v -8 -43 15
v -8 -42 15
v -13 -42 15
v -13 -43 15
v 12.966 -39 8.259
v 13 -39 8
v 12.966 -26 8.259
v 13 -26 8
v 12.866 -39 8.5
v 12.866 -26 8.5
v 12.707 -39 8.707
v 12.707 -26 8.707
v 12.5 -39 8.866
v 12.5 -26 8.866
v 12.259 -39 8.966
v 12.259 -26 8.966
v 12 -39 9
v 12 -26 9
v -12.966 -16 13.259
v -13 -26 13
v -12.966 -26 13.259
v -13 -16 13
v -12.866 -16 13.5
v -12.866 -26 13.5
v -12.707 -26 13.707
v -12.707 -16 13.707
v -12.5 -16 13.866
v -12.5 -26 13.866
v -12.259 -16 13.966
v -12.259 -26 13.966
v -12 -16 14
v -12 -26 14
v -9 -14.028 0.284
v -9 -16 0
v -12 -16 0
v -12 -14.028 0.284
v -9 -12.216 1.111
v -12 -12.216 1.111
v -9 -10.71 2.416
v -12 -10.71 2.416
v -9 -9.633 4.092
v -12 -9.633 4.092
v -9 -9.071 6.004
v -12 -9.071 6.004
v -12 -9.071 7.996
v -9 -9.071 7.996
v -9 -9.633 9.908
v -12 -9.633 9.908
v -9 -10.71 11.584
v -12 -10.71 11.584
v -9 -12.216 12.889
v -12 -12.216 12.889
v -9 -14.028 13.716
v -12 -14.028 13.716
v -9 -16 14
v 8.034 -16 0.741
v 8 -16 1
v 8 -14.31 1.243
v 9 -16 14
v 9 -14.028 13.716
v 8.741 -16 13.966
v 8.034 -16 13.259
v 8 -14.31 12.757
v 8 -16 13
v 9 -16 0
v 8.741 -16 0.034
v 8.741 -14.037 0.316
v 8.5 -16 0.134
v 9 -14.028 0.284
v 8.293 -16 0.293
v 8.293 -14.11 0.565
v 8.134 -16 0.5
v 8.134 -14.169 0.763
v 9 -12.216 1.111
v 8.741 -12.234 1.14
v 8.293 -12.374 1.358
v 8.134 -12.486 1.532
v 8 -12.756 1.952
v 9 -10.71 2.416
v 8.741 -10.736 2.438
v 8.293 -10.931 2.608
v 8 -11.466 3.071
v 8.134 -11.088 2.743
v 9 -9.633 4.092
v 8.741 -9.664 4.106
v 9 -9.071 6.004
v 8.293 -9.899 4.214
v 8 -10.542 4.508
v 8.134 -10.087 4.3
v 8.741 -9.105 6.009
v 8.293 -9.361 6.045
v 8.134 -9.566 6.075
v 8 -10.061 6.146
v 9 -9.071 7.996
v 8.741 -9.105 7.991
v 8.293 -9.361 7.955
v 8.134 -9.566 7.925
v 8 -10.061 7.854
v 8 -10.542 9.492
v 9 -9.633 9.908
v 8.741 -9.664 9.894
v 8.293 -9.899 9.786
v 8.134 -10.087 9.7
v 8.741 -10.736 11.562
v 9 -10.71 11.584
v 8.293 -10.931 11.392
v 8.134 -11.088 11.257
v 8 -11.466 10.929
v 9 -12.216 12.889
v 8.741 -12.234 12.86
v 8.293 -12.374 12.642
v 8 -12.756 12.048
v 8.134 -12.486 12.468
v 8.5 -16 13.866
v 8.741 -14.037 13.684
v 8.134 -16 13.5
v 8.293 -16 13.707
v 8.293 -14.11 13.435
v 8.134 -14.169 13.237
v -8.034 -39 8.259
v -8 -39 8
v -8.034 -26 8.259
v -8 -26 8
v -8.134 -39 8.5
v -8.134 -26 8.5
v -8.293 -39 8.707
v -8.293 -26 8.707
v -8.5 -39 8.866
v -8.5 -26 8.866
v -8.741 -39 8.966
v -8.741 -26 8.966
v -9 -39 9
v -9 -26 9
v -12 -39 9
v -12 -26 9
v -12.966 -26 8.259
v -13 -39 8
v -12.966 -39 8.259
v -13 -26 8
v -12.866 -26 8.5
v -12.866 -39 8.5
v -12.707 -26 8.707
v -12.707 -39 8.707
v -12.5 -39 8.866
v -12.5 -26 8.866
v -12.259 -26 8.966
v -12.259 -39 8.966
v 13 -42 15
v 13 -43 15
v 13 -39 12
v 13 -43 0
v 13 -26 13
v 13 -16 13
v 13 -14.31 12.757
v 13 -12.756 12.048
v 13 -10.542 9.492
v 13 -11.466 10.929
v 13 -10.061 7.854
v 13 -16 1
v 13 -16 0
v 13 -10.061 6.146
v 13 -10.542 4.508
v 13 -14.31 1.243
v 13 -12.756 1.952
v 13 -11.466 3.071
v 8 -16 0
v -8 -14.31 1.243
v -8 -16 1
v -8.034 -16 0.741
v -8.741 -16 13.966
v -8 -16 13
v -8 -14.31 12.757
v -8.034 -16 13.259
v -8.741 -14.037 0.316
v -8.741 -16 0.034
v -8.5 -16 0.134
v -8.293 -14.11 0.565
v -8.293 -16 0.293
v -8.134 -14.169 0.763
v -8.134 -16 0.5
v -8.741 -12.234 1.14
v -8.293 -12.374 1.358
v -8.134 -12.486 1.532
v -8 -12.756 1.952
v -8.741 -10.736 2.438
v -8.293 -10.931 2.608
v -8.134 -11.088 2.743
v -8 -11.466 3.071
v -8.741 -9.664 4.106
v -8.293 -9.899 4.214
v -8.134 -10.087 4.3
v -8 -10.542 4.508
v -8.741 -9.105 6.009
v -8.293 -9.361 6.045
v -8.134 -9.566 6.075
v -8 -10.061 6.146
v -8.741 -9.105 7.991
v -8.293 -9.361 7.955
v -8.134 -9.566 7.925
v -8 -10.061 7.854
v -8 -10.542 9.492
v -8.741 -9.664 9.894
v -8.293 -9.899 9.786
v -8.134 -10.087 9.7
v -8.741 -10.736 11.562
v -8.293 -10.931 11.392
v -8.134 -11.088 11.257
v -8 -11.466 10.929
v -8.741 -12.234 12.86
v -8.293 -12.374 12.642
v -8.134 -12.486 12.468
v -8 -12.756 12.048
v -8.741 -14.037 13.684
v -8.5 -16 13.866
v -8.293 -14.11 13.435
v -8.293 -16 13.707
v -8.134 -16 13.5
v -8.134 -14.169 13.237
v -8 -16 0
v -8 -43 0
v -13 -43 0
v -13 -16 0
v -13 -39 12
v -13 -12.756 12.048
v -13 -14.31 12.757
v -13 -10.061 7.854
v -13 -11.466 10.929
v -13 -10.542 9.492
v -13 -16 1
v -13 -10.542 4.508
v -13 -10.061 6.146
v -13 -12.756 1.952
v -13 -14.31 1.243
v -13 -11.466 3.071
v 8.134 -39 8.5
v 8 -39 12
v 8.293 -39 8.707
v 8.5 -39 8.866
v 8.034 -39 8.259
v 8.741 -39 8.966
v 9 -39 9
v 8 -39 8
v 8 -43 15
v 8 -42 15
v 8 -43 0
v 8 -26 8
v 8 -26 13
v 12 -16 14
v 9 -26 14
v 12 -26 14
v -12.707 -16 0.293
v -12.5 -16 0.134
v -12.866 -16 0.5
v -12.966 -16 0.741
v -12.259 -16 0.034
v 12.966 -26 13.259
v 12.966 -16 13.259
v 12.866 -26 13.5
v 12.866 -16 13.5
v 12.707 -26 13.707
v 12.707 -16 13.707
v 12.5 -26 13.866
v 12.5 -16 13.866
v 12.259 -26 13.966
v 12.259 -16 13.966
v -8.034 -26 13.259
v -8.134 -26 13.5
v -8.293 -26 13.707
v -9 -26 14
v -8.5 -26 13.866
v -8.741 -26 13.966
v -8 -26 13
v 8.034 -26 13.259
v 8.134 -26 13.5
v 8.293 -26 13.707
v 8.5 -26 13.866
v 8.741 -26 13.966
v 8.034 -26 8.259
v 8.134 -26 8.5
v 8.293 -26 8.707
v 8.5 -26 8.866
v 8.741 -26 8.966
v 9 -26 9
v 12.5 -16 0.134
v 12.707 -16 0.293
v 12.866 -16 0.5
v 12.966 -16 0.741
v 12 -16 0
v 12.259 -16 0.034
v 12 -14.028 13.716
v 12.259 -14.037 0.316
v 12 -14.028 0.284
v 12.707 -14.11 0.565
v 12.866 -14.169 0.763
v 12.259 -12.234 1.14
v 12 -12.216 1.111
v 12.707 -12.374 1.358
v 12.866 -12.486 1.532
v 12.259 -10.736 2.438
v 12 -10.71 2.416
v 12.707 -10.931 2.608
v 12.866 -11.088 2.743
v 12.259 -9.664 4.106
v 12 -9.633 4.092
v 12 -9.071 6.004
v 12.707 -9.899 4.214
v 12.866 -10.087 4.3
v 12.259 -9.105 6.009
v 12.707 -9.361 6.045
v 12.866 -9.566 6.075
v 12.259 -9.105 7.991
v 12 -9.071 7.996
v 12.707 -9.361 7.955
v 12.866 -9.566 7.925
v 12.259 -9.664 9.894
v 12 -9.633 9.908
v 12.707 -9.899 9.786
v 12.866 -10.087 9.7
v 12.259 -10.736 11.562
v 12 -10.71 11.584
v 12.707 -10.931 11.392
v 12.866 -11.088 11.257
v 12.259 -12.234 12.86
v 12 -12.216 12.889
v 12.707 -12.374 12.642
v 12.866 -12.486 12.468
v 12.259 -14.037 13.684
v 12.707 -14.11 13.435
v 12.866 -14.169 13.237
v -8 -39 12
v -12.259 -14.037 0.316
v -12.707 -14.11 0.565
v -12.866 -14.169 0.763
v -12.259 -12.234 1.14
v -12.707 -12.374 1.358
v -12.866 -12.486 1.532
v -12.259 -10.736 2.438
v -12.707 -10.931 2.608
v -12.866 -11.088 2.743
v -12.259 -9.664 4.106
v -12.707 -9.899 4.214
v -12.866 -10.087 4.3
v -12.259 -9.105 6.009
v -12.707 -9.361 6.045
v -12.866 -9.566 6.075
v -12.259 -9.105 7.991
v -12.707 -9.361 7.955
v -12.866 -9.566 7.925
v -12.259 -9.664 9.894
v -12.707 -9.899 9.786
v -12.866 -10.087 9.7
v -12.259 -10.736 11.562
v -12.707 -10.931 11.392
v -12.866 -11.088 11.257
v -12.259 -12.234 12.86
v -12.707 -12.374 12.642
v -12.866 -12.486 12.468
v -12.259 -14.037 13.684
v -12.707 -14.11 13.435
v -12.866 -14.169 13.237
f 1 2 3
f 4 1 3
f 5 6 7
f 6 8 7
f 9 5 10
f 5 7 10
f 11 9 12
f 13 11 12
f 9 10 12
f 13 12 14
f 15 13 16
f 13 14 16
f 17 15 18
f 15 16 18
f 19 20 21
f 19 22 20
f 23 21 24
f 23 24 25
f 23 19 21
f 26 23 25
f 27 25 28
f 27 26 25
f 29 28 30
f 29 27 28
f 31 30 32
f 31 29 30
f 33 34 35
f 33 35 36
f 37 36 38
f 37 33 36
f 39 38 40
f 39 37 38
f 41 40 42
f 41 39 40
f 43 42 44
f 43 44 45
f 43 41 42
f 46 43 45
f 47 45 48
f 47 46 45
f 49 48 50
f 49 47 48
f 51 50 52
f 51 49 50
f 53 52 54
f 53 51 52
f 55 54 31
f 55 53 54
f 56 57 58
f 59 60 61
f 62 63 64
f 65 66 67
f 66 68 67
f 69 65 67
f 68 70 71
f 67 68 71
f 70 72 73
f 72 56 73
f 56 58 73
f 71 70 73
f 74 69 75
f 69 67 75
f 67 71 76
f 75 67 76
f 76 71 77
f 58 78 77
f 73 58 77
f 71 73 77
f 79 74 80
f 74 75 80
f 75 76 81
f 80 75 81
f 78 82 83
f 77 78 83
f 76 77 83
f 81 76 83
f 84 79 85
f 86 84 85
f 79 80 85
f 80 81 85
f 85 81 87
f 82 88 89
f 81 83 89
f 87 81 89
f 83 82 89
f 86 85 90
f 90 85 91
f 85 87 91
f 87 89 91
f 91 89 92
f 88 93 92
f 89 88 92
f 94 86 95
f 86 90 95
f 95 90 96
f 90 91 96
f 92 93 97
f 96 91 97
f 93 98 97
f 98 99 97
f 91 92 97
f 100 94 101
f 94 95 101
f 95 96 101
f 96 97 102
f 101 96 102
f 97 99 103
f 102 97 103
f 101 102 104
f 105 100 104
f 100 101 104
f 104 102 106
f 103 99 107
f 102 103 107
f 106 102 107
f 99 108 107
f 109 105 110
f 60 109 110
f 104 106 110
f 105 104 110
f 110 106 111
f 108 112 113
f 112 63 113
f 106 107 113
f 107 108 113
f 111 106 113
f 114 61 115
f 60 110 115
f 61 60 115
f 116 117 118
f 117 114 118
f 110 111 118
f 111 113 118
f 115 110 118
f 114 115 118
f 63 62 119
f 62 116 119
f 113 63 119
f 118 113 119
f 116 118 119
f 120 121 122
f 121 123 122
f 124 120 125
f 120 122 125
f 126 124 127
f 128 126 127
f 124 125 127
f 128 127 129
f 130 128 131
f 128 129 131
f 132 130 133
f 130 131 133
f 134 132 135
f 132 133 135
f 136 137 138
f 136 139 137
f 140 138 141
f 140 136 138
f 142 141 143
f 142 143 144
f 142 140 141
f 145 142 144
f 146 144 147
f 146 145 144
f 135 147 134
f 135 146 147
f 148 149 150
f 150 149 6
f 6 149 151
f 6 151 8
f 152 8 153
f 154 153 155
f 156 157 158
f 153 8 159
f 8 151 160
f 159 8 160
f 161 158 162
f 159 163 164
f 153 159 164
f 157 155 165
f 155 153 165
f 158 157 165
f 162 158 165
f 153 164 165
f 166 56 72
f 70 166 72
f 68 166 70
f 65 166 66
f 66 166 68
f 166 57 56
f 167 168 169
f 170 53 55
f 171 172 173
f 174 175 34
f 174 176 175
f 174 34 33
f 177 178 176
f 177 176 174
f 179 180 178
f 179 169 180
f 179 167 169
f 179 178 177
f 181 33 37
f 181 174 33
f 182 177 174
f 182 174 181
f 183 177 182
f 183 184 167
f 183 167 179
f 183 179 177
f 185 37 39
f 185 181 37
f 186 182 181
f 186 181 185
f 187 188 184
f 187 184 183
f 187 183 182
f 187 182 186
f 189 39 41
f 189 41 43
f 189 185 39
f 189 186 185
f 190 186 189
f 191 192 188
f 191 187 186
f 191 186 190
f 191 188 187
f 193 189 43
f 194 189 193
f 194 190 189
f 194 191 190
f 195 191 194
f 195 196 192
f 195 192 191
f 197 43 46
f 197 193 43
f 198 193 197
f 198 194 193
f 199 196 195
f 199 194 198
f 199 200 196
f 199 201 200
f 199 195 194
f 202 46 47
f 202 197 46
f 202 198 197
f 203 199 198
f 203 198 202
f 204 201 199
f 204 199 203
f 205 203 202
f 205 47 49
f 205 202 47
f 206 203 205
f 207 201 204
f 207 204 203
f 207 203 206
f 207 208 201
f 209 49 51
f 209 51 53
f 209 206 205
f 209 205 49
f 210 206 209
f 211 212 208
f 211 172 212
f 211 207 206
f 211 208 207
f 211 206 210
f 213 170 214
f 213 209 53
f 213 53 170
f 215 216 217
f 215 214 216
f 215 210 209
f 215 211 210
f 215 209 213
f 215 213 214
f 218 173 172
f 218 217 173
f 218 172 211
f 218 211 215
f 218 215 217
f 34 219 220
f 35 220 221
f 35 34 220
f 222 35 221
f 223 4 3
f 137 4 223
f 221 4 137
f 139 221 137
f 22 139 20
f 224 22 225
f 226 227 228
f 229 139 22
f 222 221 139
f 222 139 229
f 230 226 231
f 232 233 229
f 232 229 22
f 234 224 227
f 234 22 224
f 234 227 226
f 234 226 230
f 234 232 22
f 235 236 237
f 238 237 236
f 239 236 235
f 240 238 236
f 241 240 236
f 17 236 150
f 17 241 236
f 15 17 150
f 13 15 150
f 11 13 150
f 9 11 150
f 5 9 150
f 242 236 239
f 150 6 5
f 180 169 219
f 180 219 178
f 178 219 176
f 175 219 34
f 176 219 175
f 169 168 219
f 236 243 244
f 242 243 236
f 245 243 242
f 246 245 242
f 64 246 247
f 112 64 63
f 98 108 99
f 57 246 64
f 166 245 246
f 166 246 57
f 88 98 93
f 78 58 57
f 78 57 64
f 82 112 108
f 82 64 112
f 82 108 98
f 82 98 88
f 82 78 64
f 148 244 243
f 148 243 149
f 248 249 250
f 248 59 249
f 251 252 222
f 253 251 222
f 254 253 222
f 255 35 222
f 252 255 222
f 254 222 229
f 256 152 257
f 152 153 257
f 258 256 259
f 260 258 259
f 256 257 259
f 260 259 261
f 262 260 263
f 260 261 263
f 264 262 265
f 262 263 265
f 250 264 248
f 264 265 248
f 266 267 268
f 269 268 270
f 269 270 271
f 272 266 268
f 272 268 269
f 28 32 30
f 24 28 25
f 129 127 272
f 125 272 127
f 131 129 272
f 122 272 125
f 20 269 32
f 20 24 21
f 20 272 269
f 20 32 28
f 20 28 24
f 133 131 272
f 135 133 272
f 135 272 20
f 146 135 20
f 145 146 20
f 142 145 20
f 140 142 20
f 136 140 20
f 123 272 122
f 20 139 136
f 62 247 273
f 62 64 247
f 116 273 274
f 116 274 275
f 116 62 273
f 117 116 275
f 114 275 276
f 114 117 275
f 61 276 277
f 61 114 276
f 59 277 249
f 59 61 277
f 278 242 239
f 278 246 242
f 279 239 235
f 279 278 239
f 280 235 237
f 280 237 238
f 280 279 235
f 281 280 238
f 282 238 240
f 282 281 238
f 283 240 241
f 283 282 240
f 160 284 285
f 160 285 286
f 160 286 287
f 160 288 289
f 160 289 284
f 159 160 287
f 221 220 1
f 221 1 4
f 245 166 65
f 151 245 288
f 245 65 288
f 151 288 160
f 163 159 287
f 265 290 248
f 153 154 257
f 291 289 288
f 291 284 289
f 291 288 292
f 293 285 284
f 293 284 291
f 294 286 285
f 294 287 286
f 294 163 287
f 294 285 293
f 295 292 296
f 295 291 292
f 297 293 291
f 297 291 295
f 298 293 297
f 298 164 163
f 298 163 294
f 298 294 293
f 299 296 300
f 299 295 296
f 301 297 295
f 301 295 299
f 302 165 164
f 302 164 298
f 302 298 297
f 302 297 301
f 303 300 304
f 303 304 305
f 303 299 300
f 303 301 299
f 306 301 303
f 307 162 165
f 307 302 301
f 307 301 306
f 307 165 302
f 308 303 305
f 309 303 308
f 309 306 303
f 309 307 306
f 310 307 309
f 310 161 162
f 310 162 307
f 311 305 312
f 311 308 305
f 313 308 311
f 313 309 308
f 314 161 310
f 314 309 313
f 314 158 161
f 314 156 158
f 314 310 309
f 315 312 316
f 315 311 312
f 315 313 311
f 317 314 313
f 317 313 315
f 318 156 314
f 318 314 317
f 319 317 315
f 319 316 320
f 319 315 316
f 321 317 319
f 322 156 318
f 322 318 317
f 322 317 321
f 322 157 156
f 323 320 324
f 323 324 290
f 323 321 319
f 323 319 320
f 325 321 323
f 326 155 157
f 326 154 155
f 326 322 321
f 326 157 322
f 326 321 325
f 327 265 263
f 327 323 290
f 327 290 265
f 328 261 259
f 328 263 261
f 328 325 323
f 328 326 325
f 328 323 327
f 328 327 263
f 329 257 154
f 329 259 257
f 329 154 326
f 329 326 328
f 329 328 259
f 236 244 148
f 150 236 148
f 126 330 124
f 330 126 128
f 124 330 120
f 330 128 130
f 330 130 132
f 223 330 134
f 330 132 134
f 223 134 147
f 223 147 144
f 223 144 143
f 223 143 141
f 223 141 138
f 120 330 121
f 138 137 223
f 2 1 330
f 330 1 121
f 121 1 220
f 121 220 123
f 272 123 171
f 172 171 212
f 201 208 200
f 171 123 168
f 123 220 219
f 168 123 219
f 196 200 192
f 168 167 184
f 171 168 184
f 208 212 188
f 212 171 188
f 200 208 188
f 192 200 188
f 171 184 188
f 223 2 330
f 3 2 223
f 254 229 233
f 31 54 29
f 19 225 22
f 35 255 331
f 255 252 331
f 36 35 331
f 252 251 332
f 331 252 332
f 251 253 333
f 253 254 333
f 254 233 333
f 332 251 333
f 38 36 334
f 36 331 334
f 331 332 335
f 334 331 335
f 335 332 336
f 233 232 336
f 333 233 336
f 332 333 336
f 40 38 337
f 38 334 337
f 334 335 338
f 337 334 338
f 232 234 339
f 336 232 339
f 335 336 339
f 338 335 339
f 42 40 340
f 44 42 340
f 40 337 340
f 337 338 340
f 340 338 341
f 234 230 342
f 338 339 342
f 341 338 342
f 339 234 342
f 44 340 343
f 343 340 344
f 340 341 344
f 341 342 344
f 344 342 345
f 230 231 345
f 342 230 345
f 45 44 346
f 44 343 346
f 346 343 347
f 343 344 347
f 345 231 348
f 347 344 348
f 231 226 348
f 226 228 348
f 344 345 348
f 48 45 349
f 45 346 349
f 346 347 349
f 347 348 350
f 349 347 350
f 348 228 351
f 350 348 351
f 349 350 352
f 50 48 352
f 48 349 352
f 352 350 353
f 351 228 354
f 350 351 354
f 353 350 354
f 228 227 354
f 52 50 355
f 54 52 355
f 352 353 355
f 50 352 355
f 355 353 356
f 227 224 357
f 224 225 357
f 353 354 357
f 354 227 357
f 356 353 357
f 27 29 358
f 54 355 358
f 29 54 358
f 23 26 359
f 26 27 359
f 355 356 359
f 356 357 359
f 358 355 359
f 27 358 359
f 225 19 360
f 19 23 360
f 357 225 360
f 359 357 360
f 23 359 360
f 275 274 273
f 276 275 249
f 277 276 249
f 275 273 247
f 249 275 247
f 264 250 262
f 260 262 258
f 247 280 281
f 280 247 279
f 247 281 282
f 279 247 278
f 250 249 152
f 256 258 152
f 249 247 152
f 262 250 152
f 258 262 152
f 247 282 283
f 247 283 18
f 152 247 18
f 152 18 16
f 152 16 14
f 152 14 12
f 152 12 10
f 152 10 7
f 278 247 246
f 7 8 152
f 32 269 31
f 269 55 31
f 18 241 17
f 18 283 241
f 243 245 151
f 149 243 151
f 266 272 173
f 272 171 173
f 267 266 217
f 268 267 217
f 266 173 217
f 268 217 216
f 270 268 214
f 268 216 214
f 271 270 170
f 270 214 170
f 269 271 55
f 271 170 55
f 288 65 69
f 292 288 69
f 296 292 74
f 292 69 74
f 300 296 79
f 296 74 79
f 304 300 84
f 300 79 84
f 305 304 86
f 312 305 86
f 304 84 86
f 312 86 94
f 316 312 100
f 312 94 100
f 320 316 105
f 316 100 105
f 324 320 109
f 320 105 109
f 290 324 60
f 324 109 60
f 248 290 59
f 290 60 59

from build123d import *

# Parameters (mm, degrees)
BOX003_W          = 5
BOX003_H          = 13
BOX003_DEPTH      = 9
FILLET004_R       = 1
CYLINDER006_R     = 7
CYLINDER006_DEPTH = 5
FILLET005_R       = 1
BOX001_W          = 5
BOX001_H          = 10
BOX001_DEPTH      = 14
FILLET006_R       = 1
BOX006_W          = 5
BOX006_H          = 4
BOX006_DEPTH      = 15
CHAMFER_SIZE      = 3


with BuildPart() as fillet004:
    # Box003 → Box003 (new body)
    with BuildSketch(Plane(origin=(8, -39, 0), x_dir=(1, 0, 0), z_dir=(0, 0, 1))):
        with Locations((2.5, 6.5)):
            Rectangle(BOX003_W, BOX003_H)
    extrude(amount=BOX003_DEPTH)

    # Fillet004
    fillet004_edges = [fillet004.edges().sort_by_distance(p)[0] for p in [
        (8, -32.5, 9),
        (13, -32.5, 9),
    ]]
    fillet(fillet004_edges, radius=FILLET004_R)


with BuildPart() as fillet005:
    # Cylinder006 → Cylinder006 (new body)
    with BuildSketch(Plane(origin=(8, -16, 7), x_dir=(0, 0, -1), z_dir=(1, 0, 0))):
        Circle(CYLINDER006_R)
    extrude(amount=CYLINDER006_DEPTH)

    # Fillet005
    fillet005_edges = [fillet005.edges().sort_by_distance(p)[0] for p in [
        (13, -16, 14),
        (8, -16, 14),
    ]]
    fillet(fillet005_edges, radius=FILLET005_R)


with BuildPart() as fillet006:
    # Box001 → Box001 (new body)
    with BuildSketch(Plane(origin=(8, -26, 0), x_dir=(1, 0, 0), z_dir=(0, 0, 1))):
        with Locations((2.5, 5)):
            Rectangle(BOX001_W, BOX001_H)
    extrude(amount=BOX001_DEPTH)

    # Fillet006
    fillet006_edges = [fillet006.edges().sort_by_distance(p)[0] for p in [
        (8, -21, 14),
        (13, -21, 14),
    ]]
    fillet(fillet006_edges, radius=FILLET006_R)


with BuildPart() as fusion001:
    # Box006 → Box006 (new body)
    with BuildSketch(Plane(origin=(8, -43, 0), x_dir=(1, 0, 0), z_dir=(0, 0, 1))):
        with Locations((2.5, 2)):
            Rectangle(BOX006_W, BOX006_H)
    extrude(amount=BOX006_DEPTH)

    # Chamfer
    chamfer_edges = [fusion001.edges().sort_by_distance(p)[0] for p in [
        (10.5, -39, 15),
    ]]
    chamfer(chamfer_edges, length=CHAMFER_SIZE)

    # Fusion001: union Fillet004, Fillet005, Fillet006
    add(fillet004.part)
    add(fillet005.part)
    add(fillet006.part)


with BuildPart() as front_legs:
    # Part__Mirroring: instance of Fusion001
    add(fusion001.part.mirror(Plane(origin=(0, 0, 0), x_dir=(0, -1, 0), z_dir=(1, 0, 0))))

    # Fusion003: union Fusion001
    add(fusion001.part)


solid = front_legs.part
